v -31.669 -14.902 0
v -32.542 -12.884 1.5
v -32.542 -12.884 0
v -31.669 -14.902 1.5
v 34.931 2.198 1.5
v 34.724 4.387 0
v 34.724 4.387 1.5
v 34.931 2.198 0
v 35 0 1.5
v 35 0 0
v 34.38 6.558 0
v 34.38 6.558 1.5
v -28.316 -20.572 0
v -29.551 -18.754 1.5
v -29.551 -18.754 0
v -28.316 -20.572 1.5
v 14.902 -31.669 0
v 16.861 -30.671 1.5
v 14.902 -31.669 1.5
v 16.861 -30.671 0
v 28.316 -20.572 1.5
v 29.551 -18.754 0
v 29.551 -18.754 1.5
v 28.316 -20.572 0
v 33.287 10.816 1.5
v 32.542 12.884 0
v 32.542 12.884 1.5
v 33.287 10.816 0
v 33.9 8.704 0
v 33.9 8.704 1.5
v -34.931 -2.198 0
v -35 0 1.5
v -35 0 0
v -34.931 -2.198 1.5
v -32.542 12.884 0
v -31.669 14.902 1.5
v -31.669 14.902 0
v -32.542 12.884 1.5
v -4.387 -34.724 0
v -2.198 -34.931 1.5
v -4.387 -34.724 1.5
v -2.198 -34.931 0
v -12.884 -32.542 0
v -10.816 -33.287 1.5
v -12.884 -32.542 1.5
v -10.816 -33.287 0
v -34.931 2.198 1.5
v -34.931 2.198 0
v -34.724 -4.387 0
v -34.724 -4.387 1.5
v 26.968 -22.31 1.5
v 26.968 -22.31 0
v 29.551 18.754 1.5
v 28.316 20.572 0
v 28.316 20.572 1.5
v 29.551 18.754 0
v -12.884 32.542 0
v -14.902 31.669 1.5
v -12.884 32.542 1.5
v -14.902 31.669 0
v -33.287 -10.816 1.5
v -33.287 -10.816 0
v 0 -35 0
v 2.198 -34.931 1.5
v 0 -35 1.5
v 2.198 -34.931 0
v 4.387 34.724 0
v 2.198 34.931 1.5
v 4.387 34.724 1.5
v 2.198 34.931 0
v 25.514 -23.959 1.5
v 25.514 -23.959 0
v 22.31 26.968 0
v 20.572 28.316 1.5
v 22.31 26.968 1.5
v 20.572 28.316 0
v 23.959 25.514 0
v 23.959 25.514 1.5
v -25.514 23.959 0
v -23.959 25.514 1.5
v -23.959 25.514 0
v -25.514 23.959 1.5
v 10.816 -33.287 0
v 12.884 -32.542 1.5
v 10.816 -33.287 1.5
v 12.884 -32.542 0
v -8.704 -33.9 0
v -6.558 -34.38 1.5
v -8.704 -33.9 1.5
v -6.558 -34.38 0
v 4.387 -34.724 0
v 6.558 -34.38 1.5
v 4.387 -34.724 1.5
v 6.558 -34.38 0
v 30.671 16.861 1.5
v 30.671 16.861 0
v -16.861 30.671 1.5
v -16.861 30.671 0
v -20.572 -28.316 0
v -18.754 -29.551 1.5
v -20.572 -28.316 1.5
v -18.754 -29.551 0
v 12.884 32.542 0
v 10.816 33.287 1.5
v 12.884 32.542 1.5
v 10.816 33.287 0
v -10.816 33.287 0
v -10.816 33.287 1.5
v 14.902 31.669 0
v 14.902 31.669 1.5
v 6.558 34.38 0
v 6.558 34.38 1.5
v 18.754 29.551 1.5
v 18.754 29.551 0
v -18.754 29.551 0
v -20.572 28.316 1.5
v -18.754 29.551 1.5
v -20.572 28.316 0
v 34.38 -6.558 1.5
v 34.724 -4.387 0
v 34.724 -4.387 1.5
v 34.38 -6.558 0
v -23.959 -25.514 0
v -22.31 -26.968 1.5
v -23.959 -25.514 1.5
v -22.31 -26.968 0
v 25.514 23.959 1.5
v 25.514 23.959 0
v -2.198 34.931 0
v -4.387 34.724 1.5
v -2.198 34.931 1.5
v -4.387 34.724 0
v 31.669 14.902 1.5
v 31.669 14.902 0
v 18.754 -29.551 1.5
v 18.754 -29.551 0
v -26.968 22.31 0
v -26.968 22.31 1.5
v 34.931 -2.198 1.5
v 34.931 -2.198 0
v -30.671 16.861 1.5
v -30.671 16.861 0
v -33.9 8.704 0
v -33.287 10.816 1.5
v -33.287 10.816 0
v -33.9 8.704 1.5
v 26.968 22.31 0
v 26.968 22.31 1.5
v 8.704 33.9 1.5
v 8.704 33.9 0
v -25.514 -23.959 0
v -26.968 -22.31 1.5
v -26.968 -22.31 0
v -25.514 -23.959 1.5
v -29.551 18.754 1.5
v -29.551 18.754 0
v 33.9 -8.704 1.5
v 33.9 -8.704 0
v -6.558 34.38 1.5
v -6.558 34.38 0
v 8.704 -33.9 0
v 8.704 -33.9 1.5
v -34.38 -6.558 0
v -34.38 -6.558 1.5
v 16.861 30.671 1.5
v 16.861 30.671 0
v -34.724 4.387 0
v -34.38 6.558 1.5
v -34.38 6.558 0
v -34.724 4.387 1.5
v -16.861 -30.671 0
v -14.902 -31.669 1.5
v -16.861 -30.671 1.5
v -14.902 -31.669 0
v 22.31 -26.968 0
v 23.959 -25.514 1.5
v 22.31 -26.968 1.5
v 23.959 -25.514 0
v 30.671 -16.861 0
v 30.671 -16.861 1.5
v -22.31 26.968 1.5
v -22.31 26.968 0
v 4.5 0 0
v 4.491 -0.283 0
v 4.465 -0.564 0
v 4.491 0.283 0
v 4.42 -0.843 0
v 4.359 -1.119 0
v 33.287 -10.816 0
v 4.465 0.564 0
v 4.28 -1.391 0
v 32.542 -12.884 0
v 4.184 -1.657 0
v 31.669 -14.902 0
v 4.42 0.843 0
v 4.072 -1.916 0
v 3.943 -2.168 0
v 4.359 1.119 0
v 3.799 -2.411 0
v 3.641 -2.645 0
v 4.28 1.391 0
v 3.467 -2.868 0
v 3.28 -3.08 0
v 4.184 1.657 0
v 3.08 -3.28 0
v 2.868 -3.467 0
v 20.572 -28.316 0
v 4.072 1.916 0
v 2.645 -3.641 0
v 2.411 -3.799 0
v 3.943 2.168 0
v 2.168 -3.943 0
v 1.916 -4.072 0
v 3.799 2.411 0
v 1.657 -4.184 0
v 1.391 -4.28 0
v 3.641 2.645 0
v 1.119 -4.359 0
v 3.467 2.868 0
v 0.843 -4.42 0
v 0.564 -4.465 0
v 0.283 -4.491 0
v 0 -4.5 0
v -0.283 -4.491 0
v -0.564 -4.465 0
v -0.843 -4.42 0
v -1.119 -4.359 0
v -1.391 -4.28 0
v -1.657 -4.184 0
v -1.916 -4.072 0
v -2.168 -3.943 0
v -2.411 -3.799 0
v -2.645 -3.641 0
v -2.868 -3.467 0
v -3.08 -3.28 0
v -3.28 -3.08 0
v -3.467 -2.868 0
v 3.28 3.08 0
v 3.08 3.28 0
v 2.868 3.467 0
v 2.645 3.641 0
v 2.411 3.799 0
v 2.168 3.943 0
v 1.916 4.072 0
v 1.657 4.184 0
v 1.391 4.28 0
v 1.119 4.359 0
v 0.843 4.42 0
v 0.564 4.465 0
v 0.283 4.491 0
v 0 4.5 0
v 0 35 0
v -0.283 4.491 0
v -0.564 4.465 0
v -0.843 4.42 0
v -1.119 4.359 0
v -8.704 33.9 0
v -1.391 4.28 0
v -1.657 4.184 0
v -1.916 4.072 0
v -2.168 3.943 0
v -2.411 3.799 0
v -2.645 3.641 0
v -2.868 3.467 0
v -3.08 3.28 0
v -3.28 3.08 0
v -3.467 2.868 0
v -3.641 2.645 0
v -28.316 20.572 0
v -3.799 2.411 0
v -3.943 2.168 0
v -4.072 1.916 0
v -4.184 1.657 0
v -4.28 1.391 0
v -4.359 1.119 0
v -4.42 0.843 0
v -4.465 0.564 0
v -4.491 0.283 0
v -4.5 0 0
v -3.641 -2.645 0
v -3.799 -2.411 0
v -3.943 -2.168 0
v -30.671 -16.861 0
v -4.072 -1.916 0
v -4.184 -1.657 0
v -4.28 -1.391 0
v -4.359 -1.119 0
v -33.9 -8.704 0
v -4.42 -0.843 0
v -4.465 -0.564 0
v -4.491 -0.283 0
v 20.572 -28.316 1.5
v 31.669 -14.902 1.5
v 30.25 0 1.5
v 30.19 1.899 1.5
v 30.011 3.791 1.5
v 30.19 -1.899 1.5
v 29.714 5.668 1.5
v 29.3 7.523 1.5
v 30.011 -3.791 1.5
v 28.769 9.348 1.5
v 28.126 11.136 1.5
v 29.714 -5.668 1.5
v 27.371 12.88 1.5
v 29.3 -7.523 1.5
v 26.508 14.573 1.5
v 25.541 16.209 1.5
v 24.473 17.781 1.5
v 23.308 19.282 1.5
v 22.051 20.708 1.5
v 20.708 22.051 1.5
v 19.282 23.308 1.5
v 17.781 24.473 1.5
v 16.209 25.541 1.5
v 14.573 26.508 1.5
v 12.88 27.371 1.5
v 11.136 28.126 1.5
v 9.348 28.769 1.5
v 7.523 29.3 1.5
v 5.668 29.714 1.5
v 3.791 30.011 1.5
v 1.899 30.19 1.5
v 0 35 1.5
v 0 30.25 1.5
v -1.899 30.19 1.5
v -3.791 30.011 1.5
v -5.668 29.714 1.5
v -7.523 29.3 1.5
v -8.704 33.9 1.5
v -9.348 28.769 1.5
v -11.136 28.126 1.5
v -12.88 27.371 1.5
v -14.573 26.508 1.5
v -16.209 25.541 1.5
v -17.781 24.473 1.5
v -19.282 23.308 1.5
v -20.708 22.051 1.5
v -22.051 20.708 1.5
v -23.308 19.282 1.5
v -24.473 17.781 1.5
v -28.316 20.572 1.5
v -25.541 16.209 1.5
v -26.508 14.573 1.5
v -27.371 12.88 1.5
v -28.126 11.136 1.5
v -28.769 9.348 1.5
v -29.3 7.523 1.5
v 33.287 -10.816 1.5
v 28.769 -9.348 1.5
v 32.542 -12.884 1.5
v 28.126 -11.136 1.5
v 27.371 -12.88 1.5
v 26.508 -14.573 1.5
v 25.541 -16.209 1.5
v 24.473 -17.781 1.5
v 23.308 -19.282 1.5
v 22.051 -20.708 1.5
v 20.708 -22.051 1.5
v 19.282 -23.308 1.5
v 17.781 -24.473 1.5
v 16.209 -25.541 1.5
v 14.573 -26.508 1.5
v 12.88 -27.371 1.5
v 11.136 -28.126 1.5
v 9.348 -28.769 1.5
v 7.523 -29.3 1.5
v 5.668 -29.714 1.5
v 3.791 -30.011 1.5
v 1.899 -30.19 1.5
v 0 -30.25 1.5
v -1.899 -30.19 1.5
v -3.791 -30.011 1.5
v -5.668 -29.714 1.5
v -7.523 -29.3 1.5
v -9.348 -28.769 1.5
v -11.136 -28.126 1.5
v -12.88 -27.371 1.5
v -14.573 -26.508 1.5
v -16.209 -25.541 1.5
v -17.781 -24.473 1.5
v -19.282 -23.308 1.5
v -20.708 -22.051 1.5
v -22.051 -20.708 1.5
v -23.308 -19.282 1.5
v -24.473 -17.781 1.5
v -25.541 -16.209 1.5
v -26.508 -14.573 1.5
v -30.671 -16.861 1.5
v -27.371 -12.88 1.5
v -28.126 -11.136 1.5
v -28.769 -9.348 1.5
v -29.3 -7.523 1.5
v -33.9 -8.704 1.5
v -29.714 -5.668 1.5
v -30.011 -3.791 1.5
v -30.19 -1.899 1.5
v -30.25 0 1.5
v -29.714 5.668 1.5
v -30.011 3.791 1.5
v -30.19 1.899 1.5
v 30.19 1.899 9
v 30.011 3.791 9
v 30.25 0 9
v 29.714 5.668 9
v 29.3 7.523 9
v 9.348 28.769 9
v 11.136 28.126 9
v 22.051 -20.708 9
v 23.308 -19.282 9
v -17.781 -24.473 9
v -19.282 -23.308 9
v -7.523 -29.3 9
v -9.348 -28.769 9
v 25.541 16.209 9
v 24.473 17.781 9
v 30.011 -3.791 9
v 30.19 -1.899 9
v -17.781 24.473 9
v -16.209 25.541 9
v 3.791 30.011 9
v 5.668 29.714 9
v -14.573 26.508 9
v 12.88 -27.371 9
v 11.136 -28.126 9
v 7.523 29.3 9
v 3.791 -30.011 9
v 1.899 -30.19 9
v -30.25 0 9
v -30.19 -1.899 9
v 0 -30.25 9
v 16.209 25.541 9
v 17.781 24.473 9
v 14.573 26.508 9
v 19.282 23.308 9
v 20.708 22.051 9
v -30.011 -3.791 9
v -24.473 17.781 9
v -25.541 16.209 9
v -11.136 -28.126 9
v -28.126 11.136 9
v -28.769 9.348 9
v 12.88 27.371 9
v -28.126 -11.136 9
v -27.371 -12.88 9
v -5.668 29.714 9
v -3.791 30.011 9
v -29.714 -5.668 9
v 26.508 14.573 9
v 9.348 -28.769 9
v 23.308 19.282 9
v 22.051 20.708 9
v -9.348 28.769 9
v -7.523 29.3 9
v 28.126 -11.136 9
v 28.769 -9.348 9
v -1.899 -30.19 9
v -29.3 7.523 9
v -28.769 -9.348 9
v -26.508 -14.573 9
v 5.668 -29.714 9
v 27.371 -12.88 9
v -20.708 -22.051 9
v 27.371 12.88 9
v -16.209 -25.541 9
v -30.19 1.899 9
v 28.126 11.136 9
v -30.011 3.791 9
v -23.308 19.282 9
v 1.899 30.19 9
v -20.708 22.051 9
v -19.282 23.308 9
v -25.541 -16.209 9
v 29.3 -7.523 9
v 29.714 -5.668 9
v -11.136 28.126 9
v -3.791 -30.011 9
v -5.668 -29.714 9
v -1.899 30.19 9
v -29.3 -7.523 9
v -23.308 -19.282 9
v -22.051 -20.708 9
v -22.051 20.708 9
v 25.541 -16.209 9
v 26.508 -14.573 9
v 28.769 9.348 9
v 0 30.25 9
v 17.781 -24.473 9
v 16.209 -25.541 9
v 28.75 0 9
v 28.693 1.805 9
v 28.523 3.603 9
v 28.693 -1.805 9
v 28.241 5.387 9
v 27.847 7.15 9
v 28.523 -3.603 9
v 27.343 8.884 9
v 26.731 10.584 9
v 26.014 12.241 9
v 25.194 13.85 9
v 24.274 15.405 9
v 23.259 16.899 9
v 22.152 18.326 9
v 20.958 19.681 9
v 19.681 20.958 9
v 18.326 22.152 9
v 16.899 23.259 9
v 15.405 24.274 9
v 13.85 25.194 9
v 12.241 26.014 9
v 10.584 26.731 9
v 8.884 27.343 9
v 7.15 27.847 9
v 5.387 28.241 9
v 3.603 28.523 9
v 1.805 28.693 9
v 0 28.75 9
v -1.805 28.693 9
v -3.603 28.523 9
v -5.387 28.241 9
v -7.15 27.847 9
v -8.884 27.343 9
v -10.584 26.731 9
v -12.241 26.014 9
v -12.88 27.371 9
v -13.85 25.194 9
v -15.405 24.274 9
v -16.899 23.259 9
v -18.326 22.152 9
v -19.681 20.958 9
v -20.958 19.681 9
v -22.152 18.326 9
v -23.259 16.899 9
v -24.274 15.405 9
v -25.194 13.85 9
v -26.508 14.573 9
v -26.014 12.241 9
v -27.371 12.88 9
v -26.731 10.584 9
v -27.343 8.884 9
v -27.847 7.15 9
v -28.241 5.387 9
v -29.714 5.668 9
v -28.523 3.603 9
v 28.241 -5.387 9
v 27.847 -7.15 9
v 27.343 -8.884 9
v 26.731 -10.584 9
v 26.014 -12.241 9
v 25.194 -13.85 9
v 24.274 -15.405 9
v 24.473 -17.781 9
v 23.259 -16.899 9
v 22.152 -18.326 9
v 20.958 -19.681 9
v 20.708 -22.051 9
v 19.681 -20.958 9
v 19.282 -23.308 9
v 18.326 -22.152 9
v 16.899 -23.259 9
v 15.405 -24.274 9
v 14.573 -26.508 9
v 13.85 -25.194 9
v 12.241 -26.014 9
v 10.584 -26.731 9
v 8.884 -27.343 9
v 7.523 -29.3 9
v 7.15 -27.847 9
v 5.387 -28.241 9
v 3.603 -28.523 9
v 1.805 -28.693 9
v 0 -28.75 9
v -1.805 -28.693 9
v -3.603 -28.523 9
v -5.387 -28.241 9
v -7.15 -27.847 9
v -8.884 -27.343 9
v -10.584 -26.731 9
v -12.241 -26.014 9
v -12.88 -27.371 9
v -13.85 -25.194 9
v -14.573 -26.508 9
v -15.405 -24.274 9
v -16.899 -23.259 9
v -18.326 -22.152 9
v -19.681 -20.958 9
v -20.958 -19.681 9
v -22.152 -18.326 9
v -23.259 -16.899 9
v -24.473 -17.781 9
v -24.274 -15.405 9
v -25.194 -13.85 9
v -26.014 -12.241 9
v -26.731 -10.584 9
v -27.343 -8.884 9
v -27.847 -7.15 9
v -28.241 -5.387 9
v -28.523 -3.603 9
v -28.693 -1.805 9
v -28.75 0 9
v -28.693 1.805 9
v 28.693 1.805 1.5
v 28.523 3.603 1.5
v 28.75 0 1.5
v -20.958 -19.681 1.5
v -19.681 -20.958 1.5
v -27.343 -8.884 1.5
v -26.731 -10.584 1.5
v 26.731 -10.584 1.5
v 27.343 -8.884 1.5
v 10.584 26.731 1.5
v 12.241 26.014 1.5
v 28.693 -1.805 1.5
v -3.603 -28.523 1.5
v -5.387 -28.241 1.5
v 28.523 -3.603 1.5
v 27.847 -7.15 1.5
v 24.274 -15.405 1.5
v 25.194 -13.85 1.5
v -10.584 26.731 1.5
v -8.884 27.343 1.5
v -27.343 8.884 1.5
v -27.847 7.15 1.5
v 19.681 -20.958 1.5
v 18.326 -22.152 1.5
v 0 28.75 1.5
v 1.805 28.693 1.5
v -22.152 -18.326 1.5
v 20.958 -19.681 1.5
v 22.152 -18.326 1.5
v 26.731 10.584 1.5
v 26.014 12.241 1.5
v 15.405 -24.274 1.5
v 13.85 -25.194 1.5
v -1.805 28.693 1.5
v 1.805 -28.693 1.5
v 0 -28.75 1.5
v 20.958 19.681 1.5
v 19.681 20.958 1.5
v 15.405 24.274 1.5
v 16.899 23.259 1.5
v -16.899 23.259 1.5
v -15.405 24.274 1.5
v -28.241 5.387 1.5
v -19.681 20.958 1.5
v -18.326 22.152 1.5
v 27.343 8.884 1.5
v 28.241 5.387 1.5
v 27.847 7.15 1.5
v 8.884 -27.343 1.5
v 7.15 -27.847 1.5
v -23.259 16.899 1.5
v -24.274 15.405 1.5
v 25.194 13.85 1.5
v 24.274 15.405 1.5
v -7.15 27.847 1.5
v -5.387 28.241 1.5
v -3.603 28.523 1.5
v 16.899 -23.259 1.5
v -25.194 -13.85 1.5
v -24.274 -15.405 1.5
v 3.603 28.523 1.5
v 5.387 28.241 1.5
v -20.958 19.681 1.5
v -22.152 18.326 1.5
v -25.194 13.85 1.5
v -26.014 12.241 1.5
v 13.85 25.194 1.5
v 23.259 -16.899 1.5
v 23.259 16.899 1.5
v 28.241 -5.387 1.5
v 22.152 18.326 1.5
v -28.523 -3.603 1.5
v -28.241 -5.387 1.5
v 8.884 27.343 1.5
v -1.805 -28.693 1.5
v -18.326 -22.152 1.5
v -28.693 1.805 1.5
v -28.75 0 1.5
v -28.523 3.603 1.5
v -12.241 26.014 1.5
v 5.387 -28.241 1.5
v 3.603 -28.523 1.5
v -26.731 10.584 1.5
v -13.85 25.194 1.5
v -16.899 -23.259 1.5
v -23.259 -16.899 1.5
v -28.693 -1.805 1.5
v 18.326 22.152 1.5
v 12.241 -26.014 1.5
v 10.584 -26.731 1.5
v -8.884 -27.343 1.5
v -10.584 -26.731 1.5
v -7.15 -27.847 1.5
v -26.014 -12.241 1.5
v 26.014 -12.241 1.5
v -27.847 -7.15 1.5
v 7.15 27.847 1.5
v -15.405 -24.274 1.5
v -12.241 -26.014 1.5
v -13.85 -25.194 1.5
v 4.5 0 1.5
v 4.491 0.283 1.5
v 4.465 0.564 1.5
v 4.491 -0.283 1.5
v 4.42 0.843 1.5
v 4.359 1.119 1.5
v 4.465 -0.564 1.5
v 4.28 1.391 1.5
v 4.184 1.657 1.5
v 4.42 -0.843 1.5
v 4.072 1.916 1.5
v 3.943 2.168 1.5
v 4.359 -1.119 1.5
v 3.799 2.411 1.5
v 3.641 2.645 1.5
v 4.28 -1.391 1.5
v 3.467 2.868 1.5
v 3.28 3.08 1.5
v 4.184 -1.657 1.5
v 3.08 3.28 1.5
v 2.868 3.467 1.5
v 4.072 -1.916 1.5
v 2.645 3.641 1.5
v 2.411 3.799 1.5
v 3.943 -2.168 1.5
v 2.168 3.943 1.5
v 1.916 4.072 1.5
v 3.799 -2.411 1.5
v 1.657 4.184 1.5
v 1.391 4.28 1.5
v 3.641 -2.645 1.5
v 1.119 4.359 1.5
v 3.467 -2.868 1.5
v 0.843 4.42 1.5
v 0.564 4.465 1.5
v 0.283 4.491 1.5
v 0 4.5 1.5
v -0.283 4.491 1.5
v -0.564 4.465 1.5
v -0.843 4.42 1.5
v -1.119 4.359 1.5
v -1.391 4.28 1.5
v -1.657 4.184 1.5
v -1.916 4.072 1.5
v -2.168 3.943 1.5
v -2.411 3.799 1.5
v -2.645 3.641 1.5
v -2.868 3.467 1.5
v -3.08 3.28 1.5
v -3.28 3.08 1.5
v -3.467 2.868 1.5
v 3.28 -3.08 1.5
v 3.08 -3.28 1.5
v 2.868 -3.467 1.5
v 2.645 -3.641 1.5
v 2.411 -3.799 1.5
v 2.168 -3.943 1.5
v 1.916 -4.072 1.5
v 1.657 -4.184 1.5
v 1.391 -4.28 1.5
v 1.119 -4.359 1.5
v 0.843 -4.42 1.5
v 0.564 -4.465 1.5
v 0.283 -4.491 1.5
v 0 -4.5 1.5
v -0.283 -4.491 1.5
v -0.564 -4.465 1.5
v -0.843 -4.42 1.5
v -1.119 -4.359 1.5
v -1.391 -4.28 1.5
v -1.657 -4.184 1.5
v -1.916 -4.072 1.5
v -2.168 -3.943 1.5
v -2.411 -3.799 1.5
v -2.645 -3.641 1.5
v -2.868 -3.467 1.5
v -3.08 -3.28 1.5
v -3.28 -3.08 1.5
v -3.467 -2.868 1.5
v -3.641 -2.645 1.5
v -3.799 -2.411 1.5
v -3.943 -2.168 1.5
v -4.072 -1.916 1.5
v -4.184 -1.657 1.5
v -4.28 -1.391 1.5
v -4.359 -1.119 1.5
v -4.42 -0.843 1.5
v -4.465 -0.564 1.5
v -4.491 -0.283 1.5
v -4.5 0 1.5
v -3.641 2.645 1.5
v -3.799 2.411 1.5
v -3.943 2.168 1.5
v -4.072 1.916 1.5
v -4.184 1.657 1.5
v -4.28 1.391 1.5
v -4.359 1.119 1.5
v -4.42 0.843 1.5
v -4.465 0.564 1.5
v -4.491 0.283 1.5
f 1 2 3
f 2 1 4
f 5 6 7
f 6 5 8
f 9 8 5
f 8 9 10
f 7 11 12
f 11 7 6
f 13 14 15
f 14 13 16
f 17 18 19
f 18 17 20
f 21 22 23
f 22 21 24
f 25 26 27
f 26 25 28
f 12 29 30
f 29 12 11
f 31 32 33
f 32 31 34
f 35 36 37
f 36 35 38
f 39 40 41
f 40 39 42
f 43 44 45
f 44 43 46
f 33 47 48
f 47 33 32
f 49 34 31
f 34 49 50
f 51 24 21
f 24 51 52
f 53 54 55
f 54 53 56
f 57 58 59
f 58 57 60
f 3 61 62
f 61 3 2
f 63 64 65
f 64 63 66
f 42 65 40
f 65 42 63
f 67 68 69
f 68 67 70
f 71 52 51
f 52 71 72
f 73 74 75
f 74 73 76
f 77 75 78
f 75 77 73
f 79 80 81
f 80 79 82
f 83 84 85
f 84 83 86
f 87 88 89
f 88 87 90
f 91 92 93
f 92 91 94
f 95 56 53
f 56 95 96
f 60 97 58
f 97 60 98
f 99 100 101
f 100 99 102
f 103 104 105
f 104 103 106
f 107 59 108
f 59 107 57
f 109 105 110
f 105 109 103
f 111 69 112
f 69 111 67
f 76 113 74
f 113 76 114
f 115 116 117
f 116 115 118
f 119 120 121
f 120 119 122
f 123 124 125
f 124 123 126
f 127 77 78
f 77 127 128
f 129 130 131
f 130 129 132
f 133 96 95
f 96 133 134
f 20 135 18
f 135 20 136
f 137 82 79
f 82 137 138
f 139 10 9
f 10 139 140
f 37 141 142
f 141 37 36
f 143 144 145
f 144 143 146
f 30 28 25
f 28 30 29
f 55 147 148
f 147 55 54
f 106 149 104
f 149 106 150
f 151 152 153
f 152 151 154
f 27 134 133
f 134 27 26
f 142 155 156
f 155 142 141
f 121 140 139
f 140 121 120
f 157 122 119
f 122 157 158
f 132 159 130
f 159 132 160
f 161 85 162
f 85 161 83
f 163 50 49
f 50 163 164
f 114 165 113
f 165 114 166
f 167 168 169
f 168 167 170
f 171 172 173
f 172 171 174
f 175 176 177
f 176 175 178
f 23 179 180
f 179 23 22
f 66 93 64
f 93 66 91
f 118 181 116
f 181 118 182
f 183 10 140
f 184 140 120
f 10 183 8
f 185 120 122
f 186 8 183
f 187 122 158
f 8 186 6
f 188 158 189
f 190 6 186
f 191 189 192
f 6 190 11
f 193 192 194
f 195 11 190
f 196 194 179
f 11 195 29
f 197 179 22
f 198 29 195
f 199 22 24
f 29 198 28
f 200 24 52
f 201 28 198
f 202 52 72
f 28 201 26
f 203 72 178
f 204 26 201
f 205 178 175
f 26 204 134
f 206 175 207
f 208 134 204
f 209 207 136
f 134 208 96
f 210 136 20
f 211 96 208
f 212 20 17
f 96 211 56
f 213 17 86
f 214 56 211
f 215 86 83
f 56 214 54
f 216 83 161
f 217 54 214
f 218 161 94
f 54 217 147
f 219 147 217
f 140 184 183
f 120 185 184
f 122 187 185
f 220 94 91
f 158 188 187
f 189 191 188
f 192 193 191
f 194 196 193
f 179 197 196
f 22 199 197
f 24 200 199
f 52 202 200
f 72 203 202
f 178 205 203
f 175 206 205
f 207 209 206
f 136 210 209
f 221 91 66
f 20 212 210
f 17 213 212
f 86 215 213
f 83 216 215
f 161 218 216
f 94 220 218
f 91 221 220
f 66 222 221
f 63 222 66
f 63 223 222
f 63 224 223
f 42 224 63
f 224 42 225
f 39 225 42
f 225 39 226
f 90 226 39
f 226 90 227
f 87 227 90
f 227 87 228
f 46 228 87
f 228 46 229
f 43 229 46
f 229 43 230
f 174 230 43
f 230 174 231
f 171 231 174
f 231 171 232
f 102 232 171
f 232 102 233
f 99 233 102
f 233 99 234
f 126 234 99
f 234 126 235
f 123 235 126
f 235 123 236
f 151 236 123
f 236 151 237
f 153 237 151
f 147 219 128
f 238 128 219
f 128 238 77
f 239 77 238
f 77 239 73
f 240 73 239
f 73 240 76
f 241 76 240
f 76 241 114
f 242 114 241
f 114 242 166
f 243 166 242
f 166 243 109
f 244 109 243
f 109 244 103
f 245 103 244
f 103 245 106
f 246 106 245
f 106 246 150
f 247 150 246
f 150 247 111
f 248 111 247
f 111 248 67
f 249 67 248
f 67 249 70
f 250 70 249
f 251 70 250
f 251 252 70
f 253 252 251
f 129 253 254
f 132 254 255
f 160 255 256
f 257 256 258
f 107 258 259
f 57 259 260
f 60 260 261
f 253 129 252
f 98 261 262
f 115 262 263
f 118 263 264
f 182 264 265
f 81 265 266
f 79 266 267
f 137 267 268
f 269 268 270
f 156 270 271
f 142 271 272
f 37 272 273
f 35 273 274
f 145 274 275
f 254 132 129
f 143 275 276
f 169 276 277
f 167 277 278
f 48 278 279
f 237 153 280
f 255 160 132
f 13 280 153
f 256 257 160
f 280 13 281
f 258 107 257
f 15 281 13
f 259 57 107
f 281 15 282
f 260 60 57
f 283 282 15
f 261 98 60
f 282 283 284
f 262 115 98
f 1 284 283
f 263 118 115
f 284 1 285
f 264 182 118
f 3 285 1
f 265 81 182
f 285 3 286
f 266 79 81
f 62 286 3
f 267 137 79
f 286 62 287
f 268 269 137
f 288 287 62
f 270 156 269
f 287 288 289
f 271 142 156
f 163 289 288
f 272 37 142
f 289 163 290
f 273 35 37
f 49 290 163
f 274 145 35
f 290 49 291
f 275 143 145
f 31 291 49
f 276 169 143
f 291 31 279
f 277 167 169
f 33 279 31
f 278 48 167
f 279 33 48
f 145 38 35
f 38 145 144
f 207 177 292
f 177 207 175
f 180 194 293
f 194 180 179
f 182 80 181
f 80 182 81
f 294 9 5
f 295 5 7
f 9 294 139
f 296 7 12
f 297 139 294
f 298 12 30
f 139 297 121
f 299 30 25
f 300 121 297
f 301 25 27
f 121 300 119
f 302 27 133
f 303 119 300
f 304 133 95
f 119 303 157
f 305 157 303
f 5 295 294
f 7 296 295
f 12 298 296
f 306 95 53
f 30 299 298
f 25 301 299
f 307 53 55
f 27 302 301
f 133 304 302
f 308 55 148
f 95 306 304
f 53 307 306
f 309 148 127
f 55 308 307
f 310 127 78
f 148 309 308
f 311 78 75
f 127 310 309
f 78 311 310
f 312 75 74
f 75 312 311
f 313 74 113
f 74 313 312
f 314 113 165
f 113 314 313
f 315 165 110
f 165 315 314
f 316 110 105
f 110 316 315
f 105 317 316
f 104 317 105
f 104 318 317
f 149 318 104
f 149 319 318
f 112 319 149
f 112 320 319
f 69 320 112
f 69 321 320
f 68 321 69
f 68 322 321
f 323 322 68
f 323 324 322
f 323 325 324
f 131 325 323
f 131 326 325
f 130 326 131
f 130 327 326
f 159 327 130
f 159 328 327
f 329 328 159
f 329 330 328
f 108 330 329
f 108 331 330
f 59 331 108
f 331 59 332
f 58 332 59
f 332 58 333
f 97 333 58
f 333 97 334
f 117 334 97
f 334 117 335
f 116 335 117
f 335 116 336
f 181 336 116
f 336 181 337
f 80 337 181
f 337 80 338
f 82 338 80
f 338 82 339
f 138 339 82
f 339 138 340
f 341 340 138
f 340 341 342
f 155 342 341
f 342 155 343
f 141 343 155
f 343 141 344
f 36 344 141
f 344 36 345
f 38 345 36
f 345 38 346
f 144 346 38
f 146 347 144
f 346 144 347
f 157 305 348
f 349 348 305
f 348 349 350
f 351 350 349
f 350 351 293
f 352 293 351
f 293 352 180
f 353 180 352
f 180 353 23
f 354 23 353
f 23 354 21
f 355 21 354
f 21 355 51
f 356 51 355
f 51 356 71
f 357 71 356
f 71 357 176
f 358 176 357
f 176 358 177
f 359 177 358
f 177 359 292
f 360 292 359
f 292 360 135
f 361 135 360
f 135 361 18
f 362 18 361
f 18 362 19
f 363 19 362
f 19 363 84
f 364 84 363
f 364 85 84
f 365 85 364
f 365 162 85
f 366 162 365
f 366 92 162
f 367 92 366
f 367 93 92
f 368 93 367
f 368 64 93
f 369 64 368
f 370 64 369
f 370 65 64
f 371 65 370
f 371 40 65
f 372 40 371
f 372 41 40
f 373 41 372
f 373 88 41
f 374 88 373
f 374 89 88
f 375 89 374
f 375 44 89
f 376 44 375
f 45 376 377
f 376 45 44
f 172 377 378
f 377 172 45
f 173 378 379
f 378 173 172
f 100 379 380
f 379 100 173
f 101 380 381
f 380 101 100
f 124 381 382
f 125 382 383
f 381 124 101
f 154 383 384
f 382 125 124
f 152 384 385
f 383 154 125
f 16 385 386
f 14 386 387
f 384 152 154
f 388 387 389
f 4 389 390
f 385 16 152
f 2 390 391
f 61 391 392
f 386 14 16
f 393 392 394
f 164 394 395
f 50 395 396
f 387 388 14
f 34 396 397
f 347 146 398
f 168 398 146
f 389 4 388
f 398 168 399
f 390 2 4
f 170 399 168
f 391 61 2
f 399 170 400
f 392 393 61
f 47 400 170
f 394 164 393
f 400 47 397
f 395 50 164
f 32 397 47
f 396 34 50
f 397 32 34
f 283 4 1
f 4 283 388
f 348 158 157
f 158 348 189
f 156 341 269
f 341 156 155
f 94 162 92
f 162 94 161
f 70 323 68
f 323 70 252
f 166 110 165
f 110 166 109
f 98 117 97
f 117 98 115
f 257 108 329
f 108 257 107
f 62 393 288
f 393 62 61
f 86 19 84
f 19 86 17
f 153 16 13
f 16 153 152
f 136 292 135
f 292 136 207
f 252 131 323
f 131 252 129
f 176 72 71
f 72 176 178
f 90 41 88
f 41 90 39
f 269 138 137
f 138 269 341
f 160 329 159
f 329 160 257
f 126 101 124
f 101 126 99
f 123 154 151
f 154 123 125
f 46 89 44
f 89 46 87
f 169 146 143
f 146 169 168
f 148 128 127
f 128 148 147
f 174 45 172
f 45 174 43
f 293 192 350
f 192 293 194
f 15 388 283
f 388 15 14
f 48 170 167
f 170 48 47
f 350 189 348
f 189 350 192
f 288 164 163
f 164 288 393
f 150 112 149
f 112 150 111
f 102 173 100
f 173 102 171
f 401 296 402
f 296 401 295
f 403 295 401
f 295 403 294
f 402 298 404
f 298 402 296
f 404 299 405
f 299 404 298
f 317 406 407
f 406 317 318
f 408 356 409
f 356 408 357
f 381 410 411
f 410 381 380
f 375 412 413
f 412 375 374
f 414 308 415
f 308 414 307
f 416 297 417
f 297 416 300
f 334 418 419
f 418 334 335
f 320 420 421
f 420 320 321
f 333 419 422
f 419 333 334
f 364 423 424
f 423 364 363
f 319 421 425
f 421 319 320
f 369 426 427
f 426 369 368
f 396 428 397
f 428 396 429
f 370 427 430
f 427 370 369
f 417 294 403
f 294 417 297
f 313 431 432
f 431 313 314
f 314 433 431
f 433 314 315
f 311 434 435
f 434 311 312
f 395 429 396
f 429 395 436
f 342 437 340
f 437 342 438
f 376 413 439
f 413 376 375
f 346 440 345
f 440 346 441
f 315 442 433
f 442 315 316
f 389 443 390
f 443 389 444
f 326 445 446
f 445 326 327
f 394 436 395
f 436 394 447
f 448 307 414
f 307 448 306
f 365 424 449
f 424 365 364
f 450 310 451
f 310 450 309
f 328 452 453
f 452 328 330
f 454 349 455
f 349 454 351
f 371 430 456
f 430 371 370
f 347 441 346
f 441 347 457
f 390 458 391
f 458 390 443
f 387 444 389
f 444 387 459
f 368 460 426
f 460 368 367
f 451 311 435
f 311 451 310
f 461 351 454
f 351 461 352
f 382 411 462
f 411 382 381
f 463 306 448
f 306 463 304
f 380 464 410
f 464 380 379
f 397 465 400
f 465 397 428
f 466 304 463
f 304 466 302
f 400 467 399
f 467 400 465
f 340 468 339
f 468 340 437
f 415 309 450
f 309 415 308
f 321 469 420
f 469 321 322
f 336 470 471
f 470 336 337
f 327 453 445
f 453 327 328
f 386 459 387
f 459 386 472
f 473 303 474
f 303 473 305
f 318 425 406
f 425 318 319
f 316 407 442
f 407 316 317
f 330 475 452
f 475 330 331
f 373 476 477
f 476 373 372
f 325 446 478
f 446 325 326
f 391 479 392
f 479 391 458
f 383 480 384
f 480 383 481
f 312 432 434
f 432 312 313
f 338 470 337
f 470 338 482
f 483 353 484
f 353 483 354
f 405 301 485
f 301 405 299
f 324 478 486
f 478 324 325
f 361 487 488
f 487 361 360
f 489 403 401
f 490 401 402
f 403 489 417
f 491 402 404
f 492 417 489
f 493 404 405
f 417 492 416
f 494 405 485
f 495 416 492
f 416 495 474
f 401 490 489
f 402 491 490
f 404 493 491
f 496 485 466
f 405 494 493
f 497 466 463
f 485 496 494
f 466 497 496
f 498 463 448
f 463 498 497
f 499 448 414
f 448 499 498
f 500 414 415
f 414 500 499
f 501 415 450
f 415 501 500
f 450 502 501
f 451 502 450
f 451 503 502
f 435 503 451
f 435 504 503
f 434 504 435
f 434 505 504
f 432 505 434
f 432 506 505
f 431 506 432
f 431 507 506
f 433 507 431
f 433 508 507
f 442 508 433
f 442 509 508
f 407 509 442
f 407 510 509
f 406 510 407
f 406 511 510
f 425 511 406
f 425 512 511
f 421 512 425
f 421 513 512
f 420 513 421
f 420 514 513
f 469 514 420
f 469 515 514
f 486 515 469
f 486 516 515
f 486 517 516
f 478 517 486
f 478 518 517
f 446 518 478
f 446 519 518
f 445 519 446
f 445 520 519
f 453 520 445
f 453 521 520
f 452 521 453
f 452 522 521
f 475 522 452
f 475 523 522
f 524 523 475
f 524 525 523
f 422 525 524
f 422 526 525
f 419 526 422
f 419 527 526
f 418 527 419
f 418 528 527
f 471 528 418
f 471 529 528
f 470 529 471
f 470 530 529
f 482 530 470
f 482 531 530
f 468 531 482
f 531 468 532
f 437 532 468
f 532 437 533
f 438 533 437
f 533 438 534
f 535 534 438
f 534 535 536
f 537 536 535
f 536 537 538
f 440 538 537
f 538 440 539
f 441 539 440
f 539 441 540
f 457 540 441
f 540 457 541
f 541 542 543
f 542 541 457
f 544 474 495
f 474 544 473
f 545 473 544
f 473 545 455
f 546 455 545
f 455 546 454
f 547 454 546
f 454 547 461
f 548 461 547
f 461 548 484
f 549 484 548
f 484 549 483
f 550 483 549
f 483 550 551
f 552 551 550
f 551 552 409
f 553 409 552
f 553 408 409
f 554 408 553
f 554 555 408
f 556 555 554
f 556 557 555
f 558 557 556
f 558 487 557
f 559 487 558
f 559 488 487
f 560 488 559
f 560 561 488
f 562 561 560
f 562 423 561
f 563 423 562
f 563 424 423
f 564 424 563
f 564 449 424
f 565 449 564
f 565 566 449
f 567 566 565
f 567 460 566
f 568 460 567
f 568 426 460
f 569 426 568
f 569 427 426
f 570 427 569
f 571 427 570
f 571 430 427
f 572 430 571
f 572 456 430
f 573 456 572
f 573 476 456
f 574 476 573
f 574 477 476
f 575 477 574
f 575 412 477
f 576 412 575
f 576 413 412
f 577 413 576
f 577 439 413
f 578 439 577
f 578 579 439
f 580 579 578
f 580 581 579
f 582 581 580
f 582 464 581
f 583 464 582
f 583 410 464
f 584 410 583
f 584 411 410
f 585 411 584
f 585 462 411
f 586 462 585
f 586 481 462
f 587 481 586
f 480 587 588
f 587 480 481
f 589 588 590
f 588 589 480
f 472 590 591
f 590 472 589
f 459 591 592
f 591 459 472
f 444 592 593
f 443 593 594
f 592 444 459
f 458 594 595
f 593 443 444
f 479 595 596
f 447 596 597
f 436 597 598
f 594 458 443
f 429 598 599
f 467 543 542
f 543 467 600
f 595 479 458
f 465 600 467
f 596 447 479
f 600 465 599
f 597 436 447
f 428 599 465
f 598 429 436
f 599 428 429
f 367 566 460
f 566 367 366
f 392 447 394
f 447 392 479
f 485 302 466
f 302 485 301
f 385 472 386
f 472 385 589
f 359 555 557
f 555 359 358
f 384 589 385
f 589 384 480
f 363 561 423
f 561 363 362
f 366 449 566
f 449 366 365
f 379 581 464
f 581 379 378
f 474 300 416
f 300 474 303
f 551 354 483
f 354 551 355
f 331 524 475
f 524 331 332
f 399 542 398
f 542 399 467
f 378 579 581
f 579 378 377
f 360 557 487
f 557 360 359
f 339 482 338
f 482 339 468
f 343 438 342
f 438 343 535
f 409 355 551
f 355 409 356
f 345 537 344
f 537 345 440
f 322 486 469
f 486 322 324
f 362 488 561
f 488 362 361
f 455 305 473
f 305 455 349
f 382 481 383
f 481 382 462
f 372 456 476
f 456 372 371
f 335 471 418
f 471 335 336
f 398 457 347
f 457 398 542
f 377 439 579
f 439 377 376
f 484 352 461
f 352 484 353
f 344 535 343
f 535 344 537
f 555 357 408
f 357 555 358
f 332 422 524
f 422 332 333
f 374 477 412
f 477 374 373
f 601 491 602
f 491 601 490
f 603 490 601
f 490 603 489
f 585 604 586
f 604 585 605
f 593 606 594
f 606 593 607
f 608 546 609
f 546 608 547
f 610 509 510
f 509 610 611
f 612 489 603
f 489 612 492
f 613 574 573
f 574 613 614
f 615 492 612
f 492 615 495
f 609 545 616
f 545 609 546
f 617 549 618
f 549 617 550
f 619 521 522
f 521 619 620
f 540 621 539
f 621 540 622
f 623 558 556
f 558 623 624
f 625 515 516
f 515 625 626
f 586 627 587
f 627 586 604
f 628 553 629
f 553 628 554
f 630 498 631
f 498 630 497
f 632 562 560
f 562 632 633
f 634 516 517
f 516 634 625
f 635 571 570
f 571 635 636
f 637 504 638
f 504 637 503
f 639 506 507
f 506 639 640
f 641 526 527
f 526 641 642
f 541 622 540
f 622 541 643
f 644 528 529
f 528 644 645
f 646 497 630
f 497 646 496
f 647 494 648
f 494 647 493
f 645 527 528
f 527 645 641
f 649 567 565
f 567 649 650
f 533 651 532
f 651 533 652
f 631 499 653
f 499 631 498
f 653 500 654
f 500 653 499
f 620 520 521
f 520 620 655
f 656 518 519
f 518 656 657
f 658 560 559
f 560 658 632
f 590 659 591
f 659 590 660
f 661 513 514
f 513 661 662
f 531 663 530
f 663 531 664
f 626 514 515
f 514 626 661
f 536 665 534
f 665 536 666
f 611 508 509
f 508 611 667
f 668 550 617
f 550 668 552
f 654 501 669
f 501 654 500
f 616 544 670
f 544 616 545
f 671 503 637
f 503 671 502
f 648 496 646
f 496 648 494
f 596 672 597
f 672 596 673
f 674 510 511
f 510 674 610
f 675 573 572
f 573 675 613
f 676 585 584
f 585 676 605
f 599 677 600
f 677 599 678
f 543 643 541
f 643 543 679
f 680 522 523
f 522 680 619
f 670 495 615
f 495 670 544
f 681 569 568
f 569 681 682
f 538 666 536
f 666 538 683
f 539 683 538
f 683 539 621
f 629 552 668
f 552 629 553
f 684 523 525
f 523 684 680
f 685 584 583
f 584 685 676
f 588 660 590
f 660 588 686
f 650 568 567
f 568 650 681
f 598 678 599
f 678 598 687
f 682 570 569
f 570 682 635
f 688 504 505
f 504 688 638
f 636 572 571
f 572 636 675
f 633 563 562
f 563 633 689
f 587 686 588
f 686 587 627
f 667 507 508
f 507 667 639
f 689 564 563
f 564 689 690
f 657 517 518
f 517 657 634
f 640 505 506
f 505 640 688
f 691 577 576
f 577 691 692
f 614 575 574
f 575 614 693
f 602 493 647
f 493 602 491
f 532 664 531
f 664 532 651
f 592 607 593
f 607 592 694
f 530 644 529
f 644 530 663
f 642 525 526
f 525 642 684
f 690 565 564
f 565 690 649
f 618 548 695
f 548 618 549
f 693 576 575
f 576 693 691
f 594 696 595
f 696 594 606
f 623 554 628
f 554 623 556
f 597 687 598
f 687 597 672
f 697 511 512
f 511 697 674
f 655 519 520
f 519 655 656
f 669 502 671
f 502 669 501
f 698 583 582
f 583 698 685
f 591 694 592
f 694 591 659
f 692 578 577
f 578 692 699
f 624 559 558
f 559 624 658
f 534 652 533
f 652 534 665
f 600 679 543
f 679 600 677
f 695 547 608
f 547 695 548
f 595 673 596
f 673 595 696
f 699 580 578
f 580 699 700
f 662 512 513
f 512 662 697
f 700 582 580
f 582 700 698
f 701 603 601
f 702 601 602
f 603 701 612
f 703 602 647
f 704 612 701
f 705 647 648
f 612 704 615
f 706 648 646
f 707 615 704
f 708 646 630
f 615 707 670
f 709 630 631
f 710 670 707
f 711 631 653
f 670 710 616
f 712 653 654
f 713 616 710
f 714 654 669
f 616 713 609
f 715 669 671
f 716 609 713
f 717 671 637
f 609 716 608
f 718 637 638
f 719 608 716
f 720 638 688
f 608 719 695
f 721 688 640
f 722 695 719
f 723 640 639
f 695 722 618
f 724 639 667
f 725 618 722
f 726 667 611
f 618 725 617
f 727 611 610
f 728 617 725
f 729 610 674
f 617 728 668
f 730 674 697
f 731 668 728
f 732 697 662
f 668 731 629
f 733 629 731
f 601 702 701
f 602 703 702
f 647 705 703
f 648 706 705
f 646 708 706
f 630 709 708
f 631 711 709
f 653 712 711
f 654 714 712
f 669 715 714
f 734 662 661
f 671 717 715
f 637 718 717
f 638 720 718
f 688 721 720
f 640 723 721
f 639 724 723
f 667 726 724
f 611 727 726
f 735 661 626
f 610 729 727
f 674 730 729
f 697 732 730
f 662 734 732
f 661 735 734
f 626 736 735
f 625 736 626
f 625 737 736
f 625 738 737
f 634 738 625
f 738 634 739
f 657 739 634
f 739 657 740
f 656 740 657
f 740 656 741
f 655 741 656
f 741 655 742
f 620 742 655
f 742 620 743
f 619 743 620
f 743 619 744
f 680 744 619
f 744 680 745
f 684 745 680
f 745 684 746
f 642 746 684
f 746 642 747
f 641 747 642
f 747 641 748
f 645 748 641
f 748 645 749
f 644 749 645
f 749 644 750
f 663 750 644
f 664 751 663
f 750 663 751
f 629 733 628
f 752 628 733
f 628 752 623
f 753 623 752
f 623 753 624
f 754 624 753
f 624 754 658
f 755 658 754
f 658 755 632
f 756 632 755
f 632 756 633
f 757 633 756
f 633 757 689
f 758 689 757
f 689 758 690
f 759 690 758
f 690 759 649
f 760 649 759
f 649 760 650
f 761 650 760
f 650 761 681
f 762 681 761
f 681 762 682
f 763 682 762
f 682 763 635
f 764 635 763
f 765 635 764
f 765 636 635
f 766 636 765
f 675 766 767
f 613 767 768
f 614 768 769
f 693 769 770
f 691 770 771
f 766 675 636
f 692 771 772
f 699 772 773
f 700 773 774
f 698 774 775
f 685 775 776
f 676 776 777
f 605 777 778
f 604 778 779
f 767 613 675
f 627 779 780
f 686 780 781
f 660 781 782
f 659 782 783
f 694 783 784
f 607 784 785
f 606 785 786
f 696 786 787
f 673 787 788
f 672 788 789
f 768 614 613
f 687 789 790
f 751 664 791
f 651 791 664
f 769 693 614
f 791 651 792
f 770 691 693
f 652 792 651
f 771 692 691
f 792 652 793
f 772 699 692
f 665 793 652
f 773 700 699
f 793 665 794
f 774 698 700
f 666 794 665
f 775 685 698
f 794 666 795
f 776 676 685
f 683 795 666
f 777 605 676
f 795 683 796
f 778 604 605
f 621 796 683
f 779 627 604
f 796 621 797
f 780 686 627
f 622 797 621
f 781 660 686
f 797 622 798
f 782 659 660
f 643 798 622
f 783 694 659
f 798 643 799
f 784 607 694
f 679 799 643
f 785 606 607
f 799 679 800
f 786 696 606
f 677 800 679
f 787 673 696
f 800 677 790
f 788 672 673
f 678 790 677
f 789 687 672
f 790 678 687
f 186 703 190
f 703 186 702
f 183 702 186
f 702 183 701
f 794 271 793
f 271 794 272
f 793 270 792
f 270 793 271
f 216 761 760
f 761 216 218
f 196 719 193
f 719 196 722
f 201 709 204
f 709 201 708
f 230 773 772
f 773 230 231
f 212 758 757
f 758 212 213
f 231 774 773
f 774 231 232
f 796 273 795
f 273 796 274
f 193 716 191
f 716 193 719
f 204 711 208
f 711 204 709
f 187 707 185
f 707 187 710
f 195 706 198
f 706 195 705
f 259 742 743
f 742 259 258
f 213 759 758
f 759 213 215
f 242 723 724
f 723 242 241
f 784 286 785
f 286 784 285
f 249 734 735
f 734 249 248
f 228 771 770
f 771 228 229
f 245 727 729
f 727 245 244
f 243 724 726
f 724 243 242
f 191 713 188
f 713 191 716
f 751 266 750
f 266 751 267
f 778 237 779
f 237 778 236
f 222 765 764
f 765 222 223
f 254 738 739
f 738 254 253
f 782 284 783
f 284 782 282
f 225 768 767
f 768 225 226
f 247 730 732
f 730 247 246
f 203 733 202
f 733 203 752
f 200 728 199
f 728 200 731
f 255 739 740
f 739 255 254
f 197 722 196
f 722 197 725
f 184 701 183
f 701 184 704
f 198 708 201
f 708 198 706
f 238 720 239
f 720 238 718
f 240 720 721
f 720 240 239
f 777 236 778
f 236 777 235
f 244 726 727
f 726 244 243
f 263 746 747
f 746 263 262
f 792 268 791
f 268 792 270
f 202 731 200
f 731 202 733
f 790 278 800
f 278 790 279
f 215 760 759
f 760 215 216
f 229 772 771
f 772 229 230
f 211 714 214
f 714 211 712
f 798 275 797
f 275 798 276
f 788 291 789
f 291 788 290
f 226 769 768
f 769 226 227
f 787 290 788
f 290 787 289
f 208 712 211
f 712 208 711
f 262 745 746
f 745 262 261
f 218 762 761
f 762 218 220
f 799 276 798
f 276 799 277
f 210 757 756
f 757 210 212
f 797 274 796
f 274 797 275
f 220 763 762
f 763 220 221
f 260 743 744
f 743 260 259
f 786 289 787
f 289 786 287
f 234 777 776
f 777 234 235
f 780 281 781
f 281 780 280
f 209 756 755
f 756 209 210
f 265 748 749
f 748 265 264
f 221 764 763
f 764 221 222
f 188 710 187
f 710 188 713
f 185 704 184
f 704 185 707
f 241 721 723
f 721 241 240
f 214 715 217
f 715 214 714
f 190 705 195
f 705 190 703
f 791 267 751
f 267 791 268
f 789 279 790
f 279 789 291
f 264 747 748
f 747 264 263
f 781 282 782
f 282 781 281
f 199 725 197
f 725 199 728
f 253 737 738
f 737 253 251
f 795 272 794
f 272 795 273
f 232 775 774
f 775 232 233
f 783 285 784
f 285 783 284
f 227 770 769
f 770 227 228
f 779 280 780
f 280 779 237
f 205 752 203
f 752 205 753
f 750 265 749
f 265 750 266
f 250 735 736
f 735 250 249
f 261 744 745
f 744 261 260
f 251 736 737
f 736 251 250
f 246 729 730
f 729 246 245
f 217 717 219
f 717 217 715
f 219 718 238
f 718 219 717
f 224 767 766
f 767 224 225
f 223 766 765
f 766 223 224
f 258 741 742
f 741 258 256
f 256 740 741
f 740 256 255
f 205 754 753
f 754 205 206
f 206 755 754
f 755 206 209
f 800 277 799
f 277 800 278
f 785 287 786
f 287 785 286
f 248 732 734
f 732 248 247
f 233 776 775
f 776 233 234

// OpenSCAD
HEIGHT = 9;
INNER_DIA = 57.5; // 21.5;
OUTER_DIA = 60.5; // 23.5;
HOLE_DIA = 9; // 16;
FLANGE_DIA = 70; // 30;
FLANGE_THICKNESS = 1.5; // 2;

$fn = 100;

difference() {
    union() {
        cylinder(d = FLANGE_DIA, h = FLANGE_THICKNESS);
        cylinder(d = OUTER_DIA, h = HEIGHT);
    }
    translate([0, 0, FLANGE_THICKNESS])
    cylinder(d = INNER_DIA, h = HEIGHT);
    cylinder(d = HOLE_DIA, h = HEIGHT);
}
